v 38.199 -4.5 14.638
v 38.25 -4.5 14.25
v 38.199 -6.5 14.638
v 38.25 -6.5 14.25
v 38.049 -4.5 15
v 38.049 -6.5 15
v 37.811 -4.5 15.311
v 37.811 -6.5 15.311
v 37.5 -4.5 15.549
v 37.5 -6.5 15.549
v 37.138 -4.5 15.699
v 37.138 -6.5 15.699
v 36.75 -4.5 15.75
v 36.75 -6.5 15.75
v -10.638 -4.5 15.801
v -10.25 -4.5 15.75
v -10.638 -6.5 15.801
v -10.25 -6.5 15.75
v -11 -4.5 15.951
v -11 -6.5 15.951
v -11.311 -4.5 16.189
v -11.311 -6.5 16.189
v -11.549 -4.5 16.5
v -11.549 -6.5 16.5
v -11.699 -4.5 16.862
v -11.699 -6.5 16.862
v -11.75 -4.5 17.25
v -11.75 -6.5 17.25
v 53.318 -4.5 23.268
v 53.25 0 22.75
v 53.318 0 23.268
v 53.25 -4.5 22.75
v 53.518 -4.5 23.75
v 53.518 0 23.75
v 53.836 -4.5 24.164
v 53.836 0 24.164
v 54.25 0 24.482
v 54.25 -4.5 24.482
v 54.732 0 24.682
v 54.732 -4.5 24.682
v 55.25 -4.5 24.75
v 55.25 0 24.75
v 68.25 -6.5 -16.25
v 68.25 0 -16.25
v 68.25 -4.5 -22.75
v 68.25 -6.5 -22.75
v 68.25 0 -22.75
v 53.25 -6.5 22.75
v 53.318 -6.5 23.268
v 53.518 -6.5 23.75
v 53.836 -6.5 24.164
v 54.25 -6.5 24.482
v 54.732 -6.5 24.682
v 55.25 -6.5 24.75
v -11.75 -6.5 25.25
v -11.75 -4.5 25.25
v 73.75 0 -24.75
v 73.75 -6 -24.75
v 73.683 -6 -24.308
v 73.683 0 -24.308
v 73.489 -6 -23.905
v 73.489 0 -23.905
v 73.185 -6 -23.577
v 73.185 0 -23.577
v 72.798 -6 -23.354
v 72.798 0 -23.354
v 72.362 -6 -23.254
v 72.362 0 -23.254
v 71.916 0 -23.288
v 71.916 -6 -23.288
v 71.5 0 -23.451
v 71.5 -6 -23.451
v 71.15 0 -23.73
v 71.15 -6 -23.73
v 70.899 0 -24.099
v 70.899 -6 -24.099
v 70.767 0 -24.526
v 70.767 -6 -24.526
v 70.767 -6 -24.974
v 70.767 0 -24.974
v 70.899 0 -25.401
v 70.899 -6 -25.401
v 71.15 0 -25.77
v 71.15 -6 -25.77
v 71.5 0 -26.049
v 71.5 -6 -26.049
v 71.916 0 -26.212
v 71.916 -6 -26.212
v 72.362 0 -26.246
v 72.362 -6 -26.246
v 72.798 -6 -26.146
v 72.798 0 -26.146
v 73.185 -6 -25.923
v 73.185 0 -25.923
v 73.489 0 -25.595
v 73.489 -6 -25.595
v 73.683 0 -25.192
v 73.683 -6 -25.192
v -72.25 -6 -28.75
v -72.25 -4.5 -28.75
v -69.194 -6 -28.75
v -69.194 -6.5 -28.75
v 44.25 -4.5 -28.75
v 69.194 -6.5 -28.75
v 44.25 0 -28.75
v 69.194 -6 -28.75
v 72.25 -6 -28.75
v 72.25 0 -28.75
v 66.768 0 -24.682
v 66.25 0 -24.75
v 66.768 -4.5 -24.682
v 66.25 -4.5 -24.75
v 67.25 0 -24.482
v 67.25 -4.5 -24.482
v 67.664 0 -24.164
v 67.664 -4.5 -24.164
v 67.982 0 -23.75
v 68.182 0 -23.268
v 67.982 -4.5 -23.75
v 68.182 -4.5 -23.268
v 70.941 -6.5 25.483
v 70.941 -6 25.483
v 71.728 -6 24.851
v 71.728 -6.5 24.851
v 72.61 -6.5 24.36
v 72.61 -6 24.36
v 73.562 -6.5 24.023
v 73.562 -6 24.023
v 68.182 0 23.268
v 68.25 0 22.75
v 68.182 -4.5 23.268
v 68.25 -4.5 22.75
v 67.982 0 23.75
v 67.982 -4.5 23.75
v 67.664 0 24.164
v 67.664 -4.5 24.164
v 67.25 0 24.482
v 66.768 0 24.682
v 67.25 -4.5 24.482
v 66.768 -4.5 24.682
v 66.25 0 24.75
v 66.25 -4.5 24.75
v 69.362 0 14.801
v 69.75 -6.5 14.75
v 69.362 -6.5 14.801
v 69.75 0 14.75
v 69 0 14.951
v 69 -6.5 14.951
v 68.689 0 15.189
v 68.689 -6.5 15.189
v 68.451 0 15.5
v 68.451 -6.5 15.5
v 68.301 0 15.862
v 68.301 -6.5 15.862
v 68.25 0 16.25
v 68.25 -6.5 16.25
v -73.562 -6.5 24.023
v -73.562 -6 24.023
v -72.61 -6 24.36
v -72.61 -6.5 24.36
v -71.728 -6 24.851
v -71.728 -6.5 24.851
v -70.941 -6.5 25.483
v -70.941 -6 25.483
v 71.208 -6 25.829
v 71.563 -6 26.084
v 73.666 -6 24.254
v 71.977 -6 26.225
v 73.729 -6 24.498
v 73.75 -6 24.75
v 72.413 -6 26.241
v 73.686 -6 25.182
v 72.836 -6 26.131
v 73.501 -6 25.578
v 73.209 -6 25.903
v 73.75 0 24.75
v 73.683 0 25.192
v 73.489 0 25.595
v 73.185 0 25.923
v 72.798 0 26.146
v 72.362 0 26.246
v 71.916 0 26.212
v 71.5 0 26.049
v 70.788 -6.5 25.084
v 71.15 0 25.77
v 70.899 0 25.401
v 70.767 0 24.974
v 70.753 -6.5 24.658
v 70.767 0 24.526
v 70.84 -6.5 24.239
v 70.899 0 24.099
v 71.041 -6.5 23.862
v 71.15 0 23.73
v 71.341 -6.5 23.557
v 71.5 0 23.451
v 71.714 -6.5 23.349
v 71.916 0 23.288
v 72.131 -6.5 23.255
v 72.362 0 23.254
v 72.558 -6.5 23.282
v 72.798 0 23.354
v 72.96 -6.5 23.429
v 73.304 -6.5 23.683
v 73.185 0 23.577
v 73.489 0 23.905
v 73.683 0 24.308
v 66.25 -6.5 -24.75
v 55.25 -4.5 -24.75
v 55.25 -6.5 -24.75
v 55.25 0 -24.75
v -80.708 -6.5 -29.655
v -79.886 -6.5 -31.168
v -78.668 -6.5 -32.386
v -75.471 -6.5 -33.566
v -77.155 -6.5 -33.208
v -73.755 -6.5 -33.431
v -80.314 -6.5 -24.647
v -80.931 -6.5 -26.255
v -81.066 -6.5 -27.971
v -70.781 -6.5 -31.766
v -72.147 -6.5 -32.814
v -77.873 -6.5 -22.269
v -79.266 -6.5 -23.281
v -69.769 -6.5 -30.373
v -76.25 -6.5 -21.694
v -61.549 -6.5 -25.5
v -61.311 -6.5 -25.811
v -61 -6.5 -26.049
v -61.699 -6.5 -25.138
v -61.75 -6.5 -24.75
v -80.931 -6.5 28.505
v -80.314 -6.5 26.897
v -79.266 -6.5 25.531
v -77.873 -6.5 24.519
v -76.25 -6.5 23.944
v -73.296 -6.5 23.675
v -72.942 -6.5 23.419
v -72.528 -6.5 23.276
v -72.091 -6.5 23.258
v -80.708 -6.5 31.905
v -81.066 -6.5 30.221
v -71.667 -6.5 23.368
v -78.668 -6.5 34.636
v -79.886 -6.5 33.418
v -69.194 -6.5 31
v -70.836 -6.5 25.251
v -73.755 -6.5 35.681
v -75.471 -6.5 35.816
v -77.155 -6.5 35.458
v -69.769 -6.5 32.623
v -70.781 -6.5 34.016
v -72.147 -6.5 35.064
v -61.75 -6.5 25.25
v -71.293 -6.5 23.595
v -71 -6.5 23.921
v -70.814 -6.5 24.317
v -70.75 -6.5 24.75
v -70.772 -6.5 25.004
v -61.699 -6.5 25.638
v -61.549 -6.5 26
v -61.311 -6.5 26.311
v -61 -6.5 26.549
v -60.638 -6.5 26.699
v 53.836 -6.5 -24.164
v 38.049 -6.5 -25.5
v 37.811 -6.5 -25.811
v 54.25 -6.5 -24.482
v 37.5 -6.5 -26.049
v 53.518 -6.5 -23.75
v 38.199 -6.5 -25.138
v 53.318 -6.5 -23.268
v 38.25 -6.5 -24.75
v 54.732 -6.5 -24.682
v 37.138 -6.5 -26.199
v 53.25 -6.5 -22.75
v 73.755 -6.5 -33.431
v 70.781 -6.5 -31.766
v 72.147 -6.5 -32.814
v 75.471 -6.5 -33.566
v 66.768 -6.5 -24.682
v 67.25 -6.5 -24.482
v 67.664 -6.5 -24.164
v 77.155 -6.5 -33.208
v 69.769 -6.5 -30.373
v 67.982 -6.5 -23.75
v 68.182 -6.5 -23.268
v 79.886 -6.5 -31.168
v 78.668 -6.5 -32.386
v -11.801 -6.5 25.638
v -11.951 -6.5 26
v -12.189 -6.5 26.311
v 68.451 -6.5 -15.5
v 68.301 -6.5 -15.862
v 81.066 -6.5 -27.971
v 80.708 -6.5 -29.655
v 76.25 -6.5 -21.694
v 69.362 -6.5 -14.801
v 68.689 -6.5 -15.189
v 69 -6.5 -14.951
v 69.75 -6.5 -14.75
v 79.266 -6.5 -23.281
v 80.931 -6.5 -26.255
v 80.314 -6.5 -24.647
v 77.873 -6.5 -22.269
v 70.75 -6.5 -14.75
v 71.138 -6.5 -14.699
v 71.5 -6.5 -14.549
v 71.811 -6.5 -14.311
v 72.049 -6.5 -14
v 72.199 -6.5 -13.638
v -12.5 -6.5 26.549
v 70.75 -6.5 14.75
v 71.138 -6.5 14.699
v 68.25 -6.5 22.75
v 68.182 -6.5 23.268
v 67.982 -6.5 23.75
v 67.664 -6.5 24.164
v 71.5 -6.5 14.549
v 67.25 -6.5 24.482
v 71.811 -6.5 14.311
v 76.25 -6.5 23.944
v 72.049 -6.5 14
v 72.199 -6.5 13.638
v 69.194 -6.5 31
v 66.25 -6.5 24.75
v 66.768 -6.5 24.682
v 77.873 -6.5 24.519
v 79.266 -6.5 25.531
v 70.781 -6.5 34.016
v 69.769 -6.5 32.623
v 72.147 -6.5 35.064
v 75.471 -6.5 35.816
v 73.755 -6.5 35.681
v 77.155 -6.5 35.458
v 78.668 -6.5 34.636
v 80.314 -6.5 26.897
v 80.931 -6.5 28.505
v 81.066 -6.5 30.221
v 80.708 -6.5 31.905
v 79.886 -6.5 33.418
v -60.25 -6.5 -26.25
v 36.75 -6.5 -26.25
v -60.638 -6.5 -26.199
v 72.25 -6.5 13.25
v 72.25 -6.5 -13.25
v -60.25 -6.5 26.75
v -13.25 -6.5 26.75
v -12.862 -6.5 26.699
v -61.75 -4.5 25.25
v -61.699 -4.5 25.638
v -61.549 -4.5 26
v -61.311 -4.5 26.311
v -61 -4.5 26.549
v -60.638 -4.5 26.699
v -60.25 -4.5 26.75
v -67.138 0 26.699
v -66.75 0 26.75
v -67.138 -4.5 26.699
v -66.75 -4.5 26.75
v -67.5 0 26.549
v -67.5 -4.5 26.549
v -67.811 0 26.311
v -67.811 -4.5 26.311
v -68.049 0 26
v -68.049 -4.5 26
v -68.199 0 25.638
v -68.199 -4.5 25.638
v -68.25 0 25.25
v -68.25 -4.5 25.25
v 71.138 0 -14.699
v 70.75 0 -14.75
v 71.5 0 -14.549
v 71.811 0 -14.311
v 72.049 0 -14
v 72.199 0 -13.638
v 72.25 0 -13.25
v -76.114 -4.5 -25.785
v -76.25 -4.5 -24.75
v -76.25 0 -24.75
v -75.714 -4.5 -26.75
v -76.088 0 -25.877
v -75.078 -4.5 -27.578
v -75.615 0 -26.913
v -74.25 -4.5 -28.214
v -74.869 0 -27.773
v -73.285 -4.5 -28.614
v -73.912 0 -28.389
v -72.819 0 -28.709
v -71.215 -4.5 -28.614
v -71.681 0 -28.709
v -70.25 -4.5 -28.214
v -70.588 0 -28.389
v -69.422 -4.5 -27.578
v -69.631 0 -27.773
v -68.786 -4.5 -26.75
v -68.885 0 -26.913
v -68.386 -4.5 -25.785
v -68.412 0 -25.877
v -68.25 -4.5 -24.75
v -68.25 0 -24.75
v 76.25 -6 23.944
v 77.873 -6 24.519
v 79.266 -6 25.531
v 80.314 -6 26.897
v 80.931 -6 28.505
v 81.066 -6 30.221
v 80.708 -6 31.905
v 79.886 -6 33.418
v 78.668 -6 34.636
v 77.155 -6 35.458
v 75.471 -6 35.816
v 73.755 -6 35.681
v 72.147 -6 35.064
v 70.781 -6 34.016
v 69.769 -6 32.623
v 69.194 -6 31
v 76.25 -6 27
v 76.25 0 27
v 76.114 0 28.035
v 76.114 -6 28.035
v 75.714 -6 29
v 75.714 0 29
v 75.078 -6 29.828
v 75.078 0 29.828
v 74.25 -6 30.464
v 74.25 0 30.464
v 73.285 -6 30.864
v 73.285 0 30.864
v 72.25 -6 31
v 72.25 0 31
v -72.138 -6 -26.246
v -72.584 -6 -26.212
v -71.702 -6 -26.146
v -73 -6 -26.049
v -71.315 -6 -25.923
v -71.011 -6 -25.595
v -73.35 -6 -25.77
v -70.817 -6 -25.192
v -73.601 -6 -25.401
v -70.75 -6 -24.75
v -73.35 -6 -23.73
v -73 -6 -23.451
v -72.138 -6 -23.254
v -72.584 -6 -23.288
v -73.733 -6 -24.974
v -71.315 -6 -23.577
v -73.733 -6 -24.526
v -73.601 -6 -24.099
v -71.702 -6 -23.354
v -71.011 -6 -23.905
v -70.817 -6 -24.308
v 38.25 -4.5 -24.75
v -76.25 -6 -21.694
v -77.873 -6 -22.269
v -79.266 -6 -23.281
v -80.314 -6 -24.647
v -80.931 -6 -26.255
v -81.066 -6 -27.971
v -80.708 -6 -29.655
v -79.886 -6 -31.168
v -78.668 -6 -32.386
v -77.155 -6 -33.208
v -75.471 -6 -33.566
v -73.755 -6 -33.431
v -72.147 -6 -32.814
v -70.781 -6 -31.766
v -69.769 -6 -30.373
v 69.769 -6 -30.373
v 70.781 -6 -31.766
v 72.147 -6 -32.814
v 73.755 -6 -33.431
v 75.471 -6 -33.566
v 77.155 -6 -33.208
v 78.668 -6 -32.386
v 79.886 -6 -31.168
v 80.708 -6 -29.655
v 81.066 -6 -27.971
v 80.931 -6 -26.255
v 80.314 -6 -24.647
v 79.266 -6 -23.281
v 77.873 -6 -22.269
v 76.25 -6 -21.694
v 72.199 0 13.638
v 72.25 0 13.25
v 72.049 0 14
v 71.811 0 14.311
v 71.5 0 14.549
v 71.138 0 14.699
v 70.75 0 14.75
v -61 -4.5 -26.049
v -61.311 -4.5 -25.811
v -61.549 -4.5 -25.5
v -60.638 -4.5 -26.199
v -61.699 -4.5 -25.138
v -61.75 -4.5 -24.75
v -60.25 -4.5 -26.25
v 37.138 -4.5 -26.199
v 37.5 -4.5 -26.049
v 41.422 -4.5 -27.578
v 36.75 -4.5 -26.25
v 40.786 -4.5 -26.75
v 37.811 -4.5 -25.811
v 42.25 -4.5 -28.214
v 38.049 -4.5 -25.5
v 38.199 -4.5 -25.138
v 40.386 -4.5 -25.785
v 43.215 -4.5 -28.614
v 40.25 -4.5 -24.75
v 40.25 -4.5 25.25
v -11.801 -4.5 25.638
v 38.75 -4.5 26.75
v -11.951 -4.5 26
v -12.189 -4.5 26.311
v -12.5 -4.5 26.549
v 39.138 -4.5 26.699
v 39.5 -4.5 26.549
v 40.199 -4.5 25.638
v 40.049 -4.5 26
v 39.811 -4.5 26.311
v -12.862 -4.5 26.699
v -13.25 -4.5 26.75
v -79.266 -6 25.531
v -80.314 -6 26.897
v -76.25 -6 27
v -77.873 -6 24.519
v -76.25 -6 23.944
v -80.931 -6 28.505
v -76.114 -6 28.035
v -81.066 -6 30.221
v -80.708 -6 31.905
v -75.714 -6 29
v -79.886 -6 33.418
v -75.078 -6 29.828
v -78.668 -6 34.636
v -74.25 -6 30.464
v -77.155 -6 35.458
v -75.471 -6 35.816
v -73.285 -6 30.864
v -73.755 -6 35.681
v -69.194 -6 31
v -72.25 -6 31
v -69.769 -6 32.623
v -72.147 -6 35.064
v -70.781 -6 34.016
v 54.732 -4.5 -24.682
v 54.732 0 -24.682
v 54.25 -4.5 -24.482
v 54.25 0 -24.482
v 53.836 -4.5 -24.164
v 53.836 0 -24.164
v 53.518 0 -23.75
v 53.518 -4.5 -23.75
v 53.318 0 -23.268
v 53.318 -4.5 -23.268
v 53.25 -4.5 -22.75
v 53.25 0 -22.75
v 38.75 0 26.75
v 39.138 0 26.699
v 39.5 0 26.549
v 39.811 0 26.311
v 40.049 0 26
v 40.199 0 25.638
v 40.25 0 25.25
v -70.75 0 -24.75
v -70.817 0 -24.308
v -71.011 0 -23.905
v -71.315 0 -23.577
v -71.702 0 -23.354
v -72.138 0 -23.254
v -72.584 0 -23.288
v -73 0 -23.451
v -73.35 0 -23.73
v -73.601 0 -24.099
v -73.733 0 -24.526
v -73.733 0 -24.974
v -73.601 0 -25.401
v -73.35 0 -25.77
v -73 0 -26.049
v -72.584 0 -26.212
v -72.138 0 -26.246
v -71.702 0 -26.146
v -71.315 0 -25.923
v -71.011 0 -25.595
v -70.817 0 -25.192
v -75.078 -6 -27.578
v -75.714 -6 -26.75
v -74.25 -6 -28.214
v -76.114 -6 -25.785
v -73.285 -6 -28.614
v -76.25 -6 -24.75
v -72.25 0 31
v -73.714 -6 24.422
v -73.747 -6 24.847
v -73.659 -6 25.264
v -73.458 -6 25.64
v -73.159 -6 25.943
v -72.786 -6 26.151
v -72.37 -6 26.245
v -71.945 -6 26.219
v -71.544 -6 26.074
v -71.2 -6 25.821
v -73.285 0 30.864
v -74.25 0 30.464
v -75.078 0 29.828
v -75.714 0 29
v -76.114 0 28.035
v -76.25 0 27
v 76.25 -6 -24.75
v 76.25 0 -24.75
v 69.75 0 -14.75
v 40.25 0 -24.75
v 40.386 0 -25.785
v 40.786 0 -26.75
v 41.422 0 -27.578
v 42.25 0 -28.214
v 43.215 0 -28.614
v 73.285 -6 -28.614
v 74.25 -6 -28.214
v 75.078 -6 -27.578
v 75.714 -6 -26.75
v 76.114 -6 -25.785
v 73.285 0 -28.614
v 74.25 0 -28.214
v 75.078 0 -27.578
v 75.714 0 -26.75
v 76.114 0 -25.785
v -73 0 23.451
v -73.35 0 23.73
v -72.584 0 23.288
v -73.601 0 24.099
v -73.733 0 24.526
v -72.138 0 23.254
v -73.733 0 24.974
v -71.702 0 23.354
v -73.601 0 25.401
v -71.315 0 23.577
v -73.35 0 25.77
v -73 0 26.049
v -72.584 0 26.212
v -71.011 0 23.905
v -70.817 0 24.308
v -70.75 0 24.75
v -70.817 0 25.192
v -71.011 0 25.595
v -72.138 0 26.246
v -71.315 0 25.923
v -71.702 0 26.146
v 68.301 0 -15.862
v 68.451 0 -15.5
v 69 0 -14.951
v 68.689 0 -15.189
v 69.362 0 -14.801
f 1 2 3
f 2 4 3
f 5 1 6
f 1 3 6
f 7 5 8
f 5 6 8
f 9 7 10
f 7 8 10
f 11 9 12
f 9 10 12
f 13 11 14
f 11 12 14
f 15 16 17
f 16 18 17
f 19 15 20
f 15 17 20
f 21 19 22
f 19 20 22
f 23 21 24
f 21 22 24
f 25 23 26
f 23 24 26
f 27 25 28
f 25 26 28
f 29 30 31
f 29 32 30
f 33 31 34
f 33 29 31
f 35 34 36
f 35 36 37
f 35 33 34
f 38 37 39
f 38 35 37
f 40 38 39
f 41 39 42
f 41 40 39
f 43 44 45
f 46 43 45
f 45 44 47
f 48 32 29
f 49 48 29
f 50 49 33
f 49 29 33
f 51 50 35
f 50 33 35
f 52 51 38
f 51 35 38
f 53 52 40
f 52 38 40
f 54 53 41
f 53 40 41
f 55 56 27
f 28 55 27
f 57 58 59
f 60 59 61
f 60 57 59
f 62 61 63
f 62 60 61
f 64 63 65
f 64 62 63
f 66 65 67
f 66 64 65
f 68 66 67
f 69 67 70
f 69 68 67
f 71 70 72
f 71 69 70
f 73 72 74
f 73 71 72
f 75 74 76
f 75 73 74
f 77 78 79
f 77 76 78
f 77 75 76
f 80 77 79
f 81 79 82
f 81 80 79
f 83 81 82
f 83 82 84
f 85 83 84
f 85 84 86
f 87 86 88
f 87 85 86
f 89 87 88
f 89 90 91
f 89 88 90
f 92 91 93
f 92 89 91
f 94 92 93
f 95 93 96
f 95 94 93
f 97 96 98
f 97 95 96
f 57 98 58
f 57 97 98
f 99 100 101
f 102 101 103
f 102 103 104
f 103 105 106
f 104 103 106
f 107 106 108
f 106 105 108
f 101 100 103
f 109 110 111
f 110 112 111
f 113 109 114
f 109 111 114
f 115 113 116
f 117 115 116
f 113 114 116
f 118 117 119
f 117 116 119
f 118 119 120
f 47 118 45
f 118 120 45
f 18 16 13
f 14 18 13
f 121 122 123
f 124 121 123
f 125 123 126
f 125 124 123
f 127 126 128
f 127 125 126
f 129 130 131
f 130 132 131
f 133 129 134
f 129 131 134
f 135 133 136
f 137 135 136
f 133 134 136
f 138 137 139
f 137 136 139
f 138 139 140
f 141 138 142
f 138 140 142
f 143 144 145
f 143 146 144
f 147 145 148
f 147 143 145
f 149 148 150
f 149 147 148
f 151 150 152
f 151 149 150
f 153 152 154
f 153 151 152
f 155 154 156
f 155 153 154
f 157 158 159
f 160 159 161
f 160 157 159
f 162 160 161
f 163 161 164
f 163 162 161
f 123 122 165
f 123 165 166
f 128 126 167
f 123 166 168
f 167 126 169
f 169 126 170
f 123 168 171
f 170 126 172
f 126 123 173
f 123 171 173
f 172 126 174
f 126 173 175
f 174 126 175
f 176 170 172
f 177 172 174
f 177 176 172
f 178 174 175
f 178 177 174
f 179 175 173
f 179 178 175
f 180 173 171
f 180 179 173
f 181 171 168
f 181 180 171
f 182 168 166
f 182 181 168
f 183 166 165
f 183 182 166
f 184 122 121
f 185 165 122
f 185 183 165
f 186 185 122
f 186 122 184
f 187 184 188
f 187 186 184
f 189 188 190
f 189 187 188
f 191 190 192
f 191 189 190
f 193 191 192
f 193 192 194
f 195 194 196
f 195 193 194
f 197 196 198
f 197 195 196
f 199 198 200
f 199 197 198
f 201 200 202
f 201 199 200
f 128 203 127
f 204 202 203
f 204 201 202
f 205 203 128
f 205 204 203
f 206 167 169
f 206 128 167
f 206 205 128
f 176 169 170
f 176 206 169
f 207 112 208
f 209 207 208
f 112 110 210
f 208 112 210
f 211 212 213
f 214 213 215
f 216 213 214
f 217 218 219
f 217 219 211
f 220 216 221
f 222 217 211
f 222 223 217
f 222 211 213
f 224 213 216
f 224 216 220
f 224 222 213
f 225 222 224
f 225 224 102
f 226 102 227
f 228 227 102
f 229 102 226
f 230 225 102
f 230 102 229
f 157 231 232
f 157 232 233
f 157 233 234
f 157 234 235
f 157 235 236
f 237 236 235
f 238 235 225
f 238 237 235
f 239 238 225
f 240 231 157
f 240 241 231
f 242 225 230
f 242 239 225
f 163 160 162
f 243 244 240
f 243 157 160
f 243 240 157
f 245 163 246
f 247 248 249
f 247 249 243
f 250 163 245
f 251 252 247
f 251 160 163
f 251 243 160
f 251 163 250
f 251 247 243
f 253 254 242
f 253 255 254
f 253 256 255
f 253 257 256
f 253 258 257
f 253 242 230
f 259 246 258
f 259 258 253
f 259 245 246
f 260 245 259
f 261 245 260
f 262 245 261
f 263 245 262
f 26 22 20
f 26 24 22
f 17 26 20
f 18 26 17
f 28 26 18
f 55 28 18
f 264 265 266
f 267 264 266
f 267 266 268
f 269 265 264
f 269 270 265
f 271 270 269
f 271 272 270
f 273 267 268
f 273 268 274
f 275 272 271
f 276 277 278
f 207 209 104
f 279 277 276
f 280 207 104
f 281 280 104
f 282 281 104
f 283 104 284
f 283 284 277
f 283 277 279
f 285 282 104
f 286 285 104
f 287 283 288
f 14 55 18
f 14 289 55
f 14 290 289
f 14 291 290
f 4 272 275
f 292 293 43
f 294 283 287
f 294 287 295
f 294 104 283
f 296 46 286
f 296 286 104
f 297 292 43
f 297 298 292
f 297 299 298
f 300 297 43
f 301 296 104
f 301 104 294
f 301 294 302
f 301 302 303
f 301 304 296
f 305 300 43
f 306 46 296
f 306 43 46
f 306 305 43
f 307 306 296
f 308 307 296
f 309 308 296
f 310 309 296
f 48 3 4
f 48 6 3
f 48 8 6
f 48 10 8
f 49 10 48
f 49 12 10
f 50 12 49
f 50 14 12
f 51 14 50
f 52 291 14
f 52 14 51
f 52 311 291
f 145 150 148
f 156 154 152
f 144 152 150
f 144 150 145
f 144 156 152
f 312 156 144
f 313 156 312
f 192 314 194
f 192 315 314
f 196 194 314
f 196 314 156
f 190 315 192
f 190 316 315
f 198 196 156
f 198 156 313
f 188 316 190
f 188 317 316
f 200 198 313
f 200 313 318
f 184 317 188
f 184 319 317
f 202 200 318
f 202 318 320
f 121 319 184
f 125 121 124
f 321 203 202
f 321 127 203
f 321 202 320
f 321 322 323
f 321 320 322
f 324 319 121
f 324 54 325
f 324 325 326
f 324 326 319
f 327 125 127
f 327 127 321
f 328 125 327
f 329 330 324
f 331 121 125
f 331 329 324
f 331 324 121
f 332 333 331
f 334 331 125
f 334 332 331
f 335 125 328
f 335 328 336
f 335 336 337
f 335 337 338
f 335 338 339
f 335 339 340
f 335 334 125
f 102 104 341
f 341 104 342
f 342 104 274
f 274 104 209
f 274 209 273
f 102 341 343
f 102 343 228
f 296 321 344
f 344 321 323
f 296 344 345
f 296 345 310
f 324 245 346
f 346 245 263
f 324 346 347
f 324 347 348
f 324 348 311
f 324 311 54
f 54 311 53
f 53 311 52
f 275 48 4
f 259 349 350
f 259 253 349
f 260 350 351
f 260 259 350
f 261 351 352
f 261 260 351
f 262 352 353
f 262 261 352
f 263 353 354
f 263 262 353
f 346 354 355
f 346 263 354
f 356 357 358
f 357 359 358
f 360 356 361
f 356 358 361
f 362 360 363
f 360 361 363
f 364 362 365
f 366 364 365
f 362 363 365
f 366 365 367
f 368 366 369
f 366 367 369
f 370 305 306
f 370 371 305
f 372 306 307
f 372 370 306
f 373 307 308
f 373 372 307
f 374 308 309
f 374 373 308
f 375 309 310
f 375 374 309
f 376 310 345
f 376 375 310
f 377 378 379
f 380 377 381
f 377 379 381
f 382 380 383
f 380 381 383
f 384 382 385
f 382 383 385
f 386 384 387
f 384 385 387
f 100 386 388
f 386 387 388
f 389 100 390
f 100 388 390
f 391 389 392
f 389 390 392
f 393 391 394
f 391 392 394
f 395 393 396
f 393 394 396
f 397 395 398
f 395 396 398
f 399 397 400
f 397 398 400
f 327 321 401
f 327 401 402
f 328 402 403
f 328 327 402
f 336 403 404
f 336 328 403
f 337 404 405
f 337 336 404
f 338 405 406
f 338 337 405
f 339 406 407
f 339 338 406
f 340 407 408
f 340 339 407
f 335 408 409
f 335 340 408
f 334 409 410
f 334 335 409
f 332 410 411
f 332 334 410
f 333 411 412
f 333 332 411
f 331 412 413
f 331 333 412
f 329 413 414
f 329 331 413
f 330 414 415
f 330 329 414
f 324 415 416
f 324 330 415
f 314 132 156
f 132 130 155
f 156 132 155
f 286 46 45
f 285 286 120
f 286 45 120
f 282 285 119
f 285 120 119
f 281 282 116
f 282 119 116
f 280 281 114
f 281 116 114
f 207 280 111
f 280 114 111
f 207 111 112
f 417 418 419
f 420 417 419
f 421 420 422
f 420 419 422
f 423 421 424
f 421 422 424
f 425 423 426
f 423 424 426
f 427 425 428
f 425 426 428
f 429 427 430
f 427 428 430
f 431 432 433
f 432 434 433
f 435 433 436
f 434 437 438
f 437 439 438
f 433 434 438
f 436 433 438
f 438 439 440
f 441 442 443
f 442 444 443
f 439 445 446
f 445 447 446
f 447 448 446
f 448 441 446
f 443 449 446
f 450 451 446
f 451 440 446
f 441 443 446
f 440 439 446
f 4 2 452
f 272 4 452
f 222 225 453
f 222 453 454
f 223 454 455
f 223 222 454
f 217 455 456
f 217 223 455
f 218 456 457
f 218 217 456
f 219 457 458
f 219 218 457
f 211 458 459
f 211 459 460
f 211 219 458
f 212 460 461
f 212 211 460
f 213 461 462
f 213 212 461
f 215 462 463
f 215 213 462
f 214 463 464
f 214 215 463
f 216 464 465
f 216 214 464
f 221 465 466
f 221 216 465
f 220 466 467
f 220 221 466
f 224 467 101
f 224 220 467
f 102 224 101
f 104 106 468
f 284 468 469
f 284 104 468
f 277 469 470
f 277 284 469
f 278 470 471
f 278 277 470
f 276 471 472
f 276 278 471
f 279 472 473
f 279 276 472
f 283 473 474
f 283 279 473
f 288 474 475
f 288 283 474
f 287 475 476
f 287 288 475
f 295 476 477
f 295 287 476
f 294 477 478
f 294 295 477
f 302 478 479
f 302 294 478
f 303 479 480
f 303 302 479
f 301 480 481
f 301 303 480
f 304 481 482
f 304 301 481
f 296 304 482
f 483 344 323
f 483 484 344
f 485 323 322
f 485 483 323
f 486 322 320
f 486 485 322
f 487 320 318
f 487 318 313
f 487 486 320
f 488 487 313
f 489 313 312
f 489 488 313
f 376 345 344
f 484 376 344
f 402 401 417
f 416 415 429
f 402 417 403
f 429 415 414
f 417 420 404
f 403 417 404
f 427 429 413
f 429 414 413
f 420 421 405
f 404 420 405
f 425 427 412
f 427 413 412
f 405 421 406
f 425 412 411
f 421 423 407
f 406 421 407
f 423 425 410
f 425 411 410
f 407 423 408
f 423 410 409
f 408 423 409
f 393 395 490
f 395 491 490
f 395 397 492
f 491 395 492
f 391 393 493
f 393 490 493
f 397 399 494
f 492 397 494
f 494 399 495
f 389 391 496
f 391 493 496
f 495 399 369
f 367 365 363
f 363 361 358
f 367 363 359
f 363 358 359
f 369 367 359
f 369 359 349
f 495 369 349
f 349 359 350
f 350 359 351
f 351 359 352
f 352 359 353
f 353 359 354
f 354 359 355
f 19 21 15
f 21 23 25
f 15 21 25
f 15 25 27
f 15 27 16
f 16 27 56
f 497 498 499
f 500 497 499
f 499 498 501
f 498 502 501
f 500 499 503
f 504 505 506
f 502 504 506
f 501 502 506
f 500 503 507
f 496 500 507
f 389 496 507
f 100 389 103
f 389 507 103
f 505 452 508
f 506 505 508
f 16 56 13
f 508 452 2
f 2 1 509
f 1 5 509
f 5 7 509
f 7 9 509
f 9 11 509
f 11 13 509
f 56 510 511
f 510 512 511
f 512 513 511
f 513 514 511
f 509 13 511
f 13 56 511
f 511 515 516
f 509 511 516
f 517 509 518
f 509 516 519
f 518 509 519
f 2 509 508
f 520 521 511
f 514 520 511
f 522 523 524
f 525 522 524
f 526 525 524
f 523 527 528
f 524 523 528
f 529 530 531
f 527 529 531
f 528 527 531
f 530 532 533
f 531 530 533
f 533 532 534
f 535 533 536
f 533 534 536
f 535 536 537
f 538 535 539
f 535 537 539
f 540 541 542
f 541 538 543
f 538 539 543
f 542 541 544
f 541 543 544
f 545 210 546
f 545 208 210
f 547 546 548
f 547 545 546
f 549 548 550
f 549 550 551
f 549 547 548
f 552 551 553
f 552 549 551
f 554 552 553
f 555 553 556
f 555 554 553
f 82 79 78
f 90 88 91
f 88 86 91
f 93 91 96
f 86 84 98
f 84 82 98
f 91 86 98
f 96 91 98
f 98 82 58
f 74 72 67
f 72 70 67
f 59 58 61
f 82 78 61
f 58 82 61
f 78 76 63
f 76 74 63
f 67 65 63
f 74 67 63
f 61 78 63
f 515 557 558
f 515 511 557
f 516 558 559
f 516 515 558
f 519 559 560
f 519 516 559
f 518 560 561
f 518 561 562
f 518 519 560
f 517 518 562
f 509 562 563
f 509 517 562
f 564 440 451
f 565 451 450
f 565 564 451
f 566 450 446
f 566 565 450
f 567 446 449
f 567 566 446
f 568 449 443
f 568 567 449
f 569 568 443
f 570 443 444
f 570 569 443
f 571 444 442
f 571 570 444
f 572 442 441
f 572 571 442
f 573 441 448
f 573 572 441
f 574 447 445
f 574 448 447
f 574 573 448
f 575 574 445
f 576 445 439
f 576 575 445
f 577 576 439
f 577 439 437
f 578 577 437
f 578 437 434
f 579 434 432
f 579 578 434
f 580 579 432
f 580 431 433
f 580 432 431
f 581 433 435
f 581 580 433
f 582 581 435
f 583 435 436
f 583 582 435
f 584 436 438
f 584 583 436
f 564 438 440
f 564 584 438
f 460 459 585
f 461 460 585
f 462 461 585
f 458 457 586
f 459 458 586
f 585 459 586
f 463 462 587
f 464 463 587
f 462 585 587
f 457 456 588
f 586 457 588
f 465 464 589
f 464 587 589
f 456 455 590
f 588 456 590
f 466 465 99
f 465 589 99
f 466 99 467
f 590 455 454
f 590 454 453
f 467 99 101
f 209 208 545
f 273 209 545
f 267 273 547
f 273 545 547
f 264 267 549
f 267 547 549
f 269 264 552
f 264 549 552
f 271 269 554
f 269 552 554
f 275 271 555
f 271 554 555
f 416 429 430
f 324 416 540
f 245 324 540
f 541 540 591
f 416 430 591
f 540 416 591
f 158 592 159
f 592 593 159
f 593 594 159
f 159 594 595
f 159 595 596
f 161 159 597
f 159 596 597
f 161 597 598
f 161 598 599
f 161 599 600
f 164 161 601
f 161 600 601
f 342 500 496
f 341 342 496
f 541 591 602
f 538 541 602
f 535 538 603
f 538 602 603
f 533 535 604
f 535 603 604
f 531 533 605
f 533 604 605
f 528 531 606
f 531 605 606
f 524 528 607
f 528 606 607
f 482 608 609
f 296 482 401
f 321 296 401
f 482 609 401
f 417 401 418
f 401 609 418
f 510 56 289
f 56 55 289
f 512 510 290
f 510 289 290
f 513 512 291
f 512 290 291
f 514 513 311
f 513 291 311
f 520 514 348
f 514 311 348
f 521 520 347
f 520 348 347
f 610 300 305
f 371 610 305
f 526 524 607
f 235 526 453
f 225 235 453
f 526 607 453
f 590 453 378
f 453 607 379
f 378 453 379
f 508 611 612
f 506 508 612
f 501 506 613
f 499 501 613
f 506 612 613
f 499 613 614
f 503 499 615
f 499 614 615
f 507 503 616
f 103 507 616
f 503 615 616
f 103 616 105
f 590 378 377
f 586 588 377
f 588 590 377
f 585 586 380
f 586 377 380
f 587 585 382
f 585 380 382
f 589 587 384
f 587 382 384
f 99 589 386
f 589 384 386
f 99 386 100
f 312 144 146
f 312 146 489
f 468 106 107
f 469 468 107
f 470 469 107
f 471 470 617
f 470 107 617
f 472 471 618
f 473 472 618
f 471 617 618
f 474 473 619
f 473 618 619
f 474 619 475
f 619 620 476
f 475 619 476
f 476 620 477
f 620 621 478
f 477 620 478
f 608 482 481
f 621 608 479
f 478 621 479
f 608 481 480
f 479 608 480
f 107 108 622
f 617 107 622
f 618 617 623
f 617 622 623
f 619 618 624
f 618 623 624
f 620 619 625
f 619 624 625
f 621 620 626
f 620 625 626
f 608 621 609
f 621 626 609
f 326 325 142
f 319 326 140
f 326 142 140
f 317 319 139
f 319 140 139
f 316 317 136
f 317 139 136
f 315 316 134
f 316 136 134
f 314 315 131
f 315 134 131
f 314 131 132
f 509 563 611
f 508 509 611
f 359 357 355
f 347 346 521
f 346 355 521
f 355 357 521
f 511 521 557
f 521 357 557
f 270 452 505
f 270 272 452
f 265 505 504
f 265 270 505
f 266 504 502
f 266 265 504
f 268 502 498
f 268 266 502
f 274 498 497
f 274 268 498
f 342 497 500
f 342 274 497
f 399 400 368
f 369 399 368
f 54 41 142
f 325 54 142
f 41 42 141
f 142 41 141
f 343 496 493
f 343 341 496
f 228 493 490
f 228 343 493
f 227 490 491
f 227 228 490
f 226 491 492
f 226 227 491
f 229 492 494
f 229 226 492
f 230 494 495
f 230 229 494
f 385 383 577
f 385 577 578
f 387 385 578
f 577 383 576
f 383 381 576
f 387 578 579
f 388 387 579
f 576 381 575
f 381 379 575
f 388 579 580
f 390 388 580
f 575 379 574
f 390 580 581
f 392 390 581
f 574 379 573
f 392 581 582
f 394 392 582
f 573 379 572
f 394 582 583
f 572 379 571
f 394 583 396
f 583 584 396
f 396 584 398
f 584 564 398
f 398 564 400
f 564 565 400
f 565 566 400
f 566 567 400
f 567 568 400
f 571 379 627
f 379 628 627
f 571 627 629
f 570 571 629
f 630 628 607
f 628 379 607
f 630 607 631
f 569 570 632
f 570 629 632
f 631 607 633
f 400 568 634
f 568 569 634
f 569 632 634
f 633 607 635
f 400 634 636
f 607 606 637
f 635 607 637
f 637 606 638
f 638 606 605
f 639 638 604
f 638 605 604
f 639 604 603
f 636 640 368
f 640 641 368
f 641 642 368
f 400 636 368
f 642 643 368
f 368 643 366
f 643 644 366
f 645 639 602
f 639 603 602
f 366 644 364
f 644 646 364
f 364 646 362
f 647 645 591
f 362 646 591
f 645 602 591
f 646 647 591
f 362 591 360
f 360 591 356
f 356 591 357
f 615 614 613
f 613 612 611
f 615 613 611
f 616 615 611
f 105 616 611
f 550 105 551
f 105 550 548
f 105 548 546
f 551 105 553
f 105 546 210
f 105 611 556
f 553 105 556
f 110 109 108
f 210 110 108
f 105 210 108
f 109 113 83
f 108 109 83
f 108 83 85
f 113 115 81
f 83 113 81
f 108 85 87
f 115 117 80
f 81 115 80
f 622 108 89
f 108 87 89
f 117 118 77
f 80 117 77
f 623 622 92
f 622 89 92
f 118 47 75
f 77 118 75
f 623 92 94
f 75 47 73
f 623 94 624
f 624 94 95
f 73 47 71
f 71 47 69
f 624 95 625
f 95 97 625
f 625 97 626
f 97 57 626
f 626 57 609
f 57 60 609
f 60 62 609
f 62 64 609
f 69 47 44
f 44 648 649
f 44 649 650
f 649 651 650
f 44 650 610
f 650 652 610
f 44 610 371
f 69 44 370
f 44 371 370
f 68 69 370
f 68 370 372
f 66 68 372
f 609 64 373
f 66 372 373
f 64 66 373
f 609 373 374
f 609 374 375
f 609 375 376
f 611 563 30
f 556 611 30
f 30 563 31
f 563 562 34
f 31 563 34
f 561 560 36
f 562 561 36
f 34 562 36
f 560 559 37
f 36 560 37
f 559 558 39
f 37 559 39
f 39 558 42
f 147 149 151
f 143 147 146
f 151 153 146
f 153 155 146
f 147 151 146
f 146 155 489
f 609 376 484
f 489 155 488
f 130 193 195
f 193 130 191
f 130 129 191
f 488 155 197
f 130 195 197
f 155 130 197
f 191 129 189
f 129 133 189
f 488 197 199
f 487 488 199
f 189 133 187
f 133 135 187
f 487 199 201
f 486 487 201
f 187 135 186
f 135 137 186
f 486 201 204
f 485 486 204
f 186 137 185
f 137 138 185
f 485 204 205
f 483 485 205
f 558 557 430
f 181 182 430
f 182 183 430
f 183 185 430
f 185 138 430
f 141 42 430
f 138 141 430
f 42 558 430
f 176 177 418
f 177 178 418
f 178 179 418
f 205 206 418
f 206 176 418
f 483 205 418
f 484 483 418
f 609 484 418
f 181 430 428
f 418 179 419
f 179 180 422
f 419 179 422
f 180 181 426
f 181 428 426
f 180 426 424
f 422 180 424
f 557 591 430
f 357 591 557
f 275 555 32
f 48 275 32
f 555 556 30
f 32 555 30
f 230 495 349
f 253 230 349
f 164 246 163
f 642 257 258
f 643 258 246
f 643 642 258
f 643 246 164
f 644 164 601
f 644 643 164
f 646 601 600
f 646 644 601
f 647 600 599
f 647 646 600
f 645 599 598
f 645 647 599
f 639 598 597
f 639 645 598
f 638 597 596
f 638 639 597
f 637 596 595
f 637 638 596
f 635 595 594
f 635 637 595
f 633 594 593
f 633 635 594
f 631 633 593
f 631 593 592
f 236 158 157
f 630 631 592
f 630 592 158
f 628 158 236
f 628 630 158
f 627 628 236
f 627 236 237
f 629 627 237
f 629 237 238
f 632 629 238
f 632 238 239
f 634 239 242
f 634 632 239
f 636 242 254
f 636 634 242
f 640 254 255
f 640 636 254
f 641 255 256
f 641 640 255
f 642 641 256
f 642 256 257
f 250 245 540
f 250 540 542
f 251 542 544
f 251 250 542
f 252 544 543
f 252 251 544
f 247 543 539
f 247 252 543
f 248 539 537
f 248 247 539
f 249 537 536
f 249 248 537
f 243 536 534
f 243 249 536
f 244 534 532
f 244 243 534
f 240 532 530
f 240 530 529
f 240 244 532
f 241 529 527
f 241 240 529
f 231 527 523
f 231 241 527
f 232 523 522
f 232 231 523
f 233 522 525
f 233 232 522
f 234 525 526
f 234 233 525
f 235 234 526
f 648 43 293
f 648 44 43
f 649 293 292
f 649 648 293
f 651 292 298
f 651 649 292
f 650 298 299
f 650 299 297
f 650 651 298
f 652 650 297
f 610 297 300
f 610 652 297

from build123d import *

# Parameters (mm, degrees)
F0_R     = 1.5
F0_W     = 15
F0_H     = 49.5
F1_DEPTH = 4.5
F2_R     = 2
F3_R     = 1.5
F4_DEPTH = 2
F5_W     = 4
F5_H     = 29.5
F6_DEPTH = 6.501
F7_R     = 1.5
F8_R     = 6
F9_DEPTH = 0.5


with BuildPart() as f1:
    # F0 (on Front) → F1 (new body)
    with BuildSketch(Plane.XZ):
        with BuildLine():
            ThreePointArc((-76.25, -24.75), (-72.25, -28.75), (-68.25, -24.75))
            Line((-68.25, -24.75), (-68.25, 24.75))
            Line((-68.25, 24.75), (-68.25, 26.75))
            Line((-68.25, 26.75), (40.25, 26.75))
            Line((40.25, 26.75), (40.25, 24.75))
            Line((40.25, 24.75), (40.25, -24.75))
            ThreePointArc((40.25, -24.75), (41.4215728753, -27.5784271247), (44.25, -28.75))
            Line((44.25, -28.75), (72.25, -28.75))
            ThreePointArc((72.25, -28.75), (75.0784271247, -27.5784271247), (76.25, -24.75))
            Line((76.25, -24.75), (76.25, 27))
            ThreePointArc((76.25, 27), (75.0784271247, 29.8284271247), (72.25, 31))
            Line((72.25, 31), (-72.25, 31))
            ThreePointArc((-72.25, 31), (-75.0784271247, 29.8284271247), (-76.25, 27))
            Line((-76.25, 27), (-76.25, -24.75))
        make_face()
        with Locations((-72.25, -24.75)):
            Circle(F0_R, mode=Mode.SUBTRACT)
        with Locations((72.25, -24.75)):
            Circle(F0_R, mode=Mode.SUBTRACT)
        with Locations((60.75, 0)):
            Rectangle(F0_W, F0_H, mode=Mode.SUBTRACT)
        with Locations((-72.25, 24.75)):
            Circle(F0_R, mode=Mode.SUBTRACT)
        with Locations((72.25, 24.75)):
            Circle(F0_R, mode=Mode.SUBTRACT)
    extrude(amount=F1_DEPTH)

    # F2
    f2_edges = [f1.edges().sort_by_distance(p)[0] for p in [
        (-68.25, -2.25, -24.75),
        (40.25, -2.25, -24.75),
        (68.25, -2.25, 24.75),
        (53.25, -2.25, 24.75),
        (53.25, -2.25, -24.75),
        (68.25, -2.25, -24.75),
    ]]
    fillet(f2_edges, radius=F2_R)

    # F3 (on face) → F4 (join)
    with BuildSketch(Plane.XZ.offset(4.5)):
        with BuildLine():
            Line((-76.25, 27), (-76.25, -24.75))
            ThreePointArc((-76.25, -24.75), (-75.0784271247, -27.5784271247), (-72.25, -28.75))
            Line((-72.25, -28.75), (72.25, -28.75))
            ThreePointArc((72.25, -28.75), (75.0784271247, -27.5784271247), (76.25, -24.75))
            Line((76.25, -24.75), (76.25, 27))
            ThreePointArc((76.25, 27), (75.0784271247, 29.8284271247), (72.25, 31))
            Line((72.25, 31), (-72.25, 31))
            ThreePointArc((-72.25, 31), (-75.0784271247, 29.8284271247), (-76.25, 27))
        make_face()
        with Locations((-72.25, -24.75)):
            Circle(F3_R, mode=Mode.SUBTRACT)
        Polygon((38.25, -26.25), (-61.75, -26.25), (-61.75, 15.75), (-61.75, 26.75), (-11.75, 26.75), (-11.75, 15.75), (38.25, 15.75), align=None, mode=Mode.SUBTRACT)
        with Locations((72.25, -24.75)):
            Circle(F3_R, mode=Mode.SUBTRACT)
        with BuildLine():
            ThreePointArc((55.25, -24.75), (53.8357864376, -24.1642135624), (53.25, -22.75))
            Line((53.25, -22.75), (53.25, 22.75))
            ThreePointArc((53.25, 22.75), (53.8357864376, 24.1642135624), (55.25, 24.75))
            Line((55.25, 24.75), (66.25, 24.75))
            ThreePointArc((66.25, 24.75), (67.6642135624, 24.1642135624), (68.25, 22.75))
            Line((68.25, 22.75), (68.25, -22.75))
            ThreePointArc((68.25, -22.75), (67.6642135624, -24.1642135624), (66.25, -24.75))
            Line((66.25, -24.75), (55.25, -24.75))
        make_face(mode=Mode.SUBTRACT)
        with Locations((-72.25, 24.75)):
            Circle(F3_R, mode=Mode.SUBTRACT)
        with Locations((72.25, 24.75)):
            Circle(F3_R, mode=Mode.SUBTRACT)
    extrude(amount=F4_DEPTH)

    # F5 (on face) → F6 (cut, through all)
    with BuildSketch(Plane.XZ.offset(6.5)):
        with Locations((70.25, 0)):
            Rectangle(F5_W, F5_H)
    extrude(amount=-F6_DEPTH, mode=Mode.SUBTRACT)

    # F7
    f7_edges = [f1.edges().sort_by_distance(p)[0] for p in [
        (-11.75, -5.5, 26.75),
        (-11.75, -5.5, 15.75),
        (-61.75, -5.5, 26.75),
        (38.25, -5.5, 15.75),
        (38.25, -5.5, -26.25),
        (-61.75, -5.5, -26.25),
        (68.25, -3.25, 14.75),
        (72.25, -3.25, 14.75),
        (68.25, -3.25, -14.75),
        (72.25, -3.25, -14.75),
        (40.25, -2.25, 26.75),
        (-68.25, -2.25, 26.75),
    ]]
    fillet(f7_edges, radius=F7_R)

    # F8 (on face) → F9 (join)
    with BuildSketch(Plane.XZ.offset(6.5)):
        with Locations((-75.0784271247, 29.8284271247)):
            Circle(F8_R)
        with Locations((-75.0784271247, -27.5784271247)):
            Circle(F8_R)
        with Locations((75.0784271247, 29.8284271247)):
            Circle(F8_R)
        with Locations((75.0784271247, -27.5784271247)):
            Circle(F8_R)
    extrude(amount=-F9_DEPTH)


solid = f1.part
